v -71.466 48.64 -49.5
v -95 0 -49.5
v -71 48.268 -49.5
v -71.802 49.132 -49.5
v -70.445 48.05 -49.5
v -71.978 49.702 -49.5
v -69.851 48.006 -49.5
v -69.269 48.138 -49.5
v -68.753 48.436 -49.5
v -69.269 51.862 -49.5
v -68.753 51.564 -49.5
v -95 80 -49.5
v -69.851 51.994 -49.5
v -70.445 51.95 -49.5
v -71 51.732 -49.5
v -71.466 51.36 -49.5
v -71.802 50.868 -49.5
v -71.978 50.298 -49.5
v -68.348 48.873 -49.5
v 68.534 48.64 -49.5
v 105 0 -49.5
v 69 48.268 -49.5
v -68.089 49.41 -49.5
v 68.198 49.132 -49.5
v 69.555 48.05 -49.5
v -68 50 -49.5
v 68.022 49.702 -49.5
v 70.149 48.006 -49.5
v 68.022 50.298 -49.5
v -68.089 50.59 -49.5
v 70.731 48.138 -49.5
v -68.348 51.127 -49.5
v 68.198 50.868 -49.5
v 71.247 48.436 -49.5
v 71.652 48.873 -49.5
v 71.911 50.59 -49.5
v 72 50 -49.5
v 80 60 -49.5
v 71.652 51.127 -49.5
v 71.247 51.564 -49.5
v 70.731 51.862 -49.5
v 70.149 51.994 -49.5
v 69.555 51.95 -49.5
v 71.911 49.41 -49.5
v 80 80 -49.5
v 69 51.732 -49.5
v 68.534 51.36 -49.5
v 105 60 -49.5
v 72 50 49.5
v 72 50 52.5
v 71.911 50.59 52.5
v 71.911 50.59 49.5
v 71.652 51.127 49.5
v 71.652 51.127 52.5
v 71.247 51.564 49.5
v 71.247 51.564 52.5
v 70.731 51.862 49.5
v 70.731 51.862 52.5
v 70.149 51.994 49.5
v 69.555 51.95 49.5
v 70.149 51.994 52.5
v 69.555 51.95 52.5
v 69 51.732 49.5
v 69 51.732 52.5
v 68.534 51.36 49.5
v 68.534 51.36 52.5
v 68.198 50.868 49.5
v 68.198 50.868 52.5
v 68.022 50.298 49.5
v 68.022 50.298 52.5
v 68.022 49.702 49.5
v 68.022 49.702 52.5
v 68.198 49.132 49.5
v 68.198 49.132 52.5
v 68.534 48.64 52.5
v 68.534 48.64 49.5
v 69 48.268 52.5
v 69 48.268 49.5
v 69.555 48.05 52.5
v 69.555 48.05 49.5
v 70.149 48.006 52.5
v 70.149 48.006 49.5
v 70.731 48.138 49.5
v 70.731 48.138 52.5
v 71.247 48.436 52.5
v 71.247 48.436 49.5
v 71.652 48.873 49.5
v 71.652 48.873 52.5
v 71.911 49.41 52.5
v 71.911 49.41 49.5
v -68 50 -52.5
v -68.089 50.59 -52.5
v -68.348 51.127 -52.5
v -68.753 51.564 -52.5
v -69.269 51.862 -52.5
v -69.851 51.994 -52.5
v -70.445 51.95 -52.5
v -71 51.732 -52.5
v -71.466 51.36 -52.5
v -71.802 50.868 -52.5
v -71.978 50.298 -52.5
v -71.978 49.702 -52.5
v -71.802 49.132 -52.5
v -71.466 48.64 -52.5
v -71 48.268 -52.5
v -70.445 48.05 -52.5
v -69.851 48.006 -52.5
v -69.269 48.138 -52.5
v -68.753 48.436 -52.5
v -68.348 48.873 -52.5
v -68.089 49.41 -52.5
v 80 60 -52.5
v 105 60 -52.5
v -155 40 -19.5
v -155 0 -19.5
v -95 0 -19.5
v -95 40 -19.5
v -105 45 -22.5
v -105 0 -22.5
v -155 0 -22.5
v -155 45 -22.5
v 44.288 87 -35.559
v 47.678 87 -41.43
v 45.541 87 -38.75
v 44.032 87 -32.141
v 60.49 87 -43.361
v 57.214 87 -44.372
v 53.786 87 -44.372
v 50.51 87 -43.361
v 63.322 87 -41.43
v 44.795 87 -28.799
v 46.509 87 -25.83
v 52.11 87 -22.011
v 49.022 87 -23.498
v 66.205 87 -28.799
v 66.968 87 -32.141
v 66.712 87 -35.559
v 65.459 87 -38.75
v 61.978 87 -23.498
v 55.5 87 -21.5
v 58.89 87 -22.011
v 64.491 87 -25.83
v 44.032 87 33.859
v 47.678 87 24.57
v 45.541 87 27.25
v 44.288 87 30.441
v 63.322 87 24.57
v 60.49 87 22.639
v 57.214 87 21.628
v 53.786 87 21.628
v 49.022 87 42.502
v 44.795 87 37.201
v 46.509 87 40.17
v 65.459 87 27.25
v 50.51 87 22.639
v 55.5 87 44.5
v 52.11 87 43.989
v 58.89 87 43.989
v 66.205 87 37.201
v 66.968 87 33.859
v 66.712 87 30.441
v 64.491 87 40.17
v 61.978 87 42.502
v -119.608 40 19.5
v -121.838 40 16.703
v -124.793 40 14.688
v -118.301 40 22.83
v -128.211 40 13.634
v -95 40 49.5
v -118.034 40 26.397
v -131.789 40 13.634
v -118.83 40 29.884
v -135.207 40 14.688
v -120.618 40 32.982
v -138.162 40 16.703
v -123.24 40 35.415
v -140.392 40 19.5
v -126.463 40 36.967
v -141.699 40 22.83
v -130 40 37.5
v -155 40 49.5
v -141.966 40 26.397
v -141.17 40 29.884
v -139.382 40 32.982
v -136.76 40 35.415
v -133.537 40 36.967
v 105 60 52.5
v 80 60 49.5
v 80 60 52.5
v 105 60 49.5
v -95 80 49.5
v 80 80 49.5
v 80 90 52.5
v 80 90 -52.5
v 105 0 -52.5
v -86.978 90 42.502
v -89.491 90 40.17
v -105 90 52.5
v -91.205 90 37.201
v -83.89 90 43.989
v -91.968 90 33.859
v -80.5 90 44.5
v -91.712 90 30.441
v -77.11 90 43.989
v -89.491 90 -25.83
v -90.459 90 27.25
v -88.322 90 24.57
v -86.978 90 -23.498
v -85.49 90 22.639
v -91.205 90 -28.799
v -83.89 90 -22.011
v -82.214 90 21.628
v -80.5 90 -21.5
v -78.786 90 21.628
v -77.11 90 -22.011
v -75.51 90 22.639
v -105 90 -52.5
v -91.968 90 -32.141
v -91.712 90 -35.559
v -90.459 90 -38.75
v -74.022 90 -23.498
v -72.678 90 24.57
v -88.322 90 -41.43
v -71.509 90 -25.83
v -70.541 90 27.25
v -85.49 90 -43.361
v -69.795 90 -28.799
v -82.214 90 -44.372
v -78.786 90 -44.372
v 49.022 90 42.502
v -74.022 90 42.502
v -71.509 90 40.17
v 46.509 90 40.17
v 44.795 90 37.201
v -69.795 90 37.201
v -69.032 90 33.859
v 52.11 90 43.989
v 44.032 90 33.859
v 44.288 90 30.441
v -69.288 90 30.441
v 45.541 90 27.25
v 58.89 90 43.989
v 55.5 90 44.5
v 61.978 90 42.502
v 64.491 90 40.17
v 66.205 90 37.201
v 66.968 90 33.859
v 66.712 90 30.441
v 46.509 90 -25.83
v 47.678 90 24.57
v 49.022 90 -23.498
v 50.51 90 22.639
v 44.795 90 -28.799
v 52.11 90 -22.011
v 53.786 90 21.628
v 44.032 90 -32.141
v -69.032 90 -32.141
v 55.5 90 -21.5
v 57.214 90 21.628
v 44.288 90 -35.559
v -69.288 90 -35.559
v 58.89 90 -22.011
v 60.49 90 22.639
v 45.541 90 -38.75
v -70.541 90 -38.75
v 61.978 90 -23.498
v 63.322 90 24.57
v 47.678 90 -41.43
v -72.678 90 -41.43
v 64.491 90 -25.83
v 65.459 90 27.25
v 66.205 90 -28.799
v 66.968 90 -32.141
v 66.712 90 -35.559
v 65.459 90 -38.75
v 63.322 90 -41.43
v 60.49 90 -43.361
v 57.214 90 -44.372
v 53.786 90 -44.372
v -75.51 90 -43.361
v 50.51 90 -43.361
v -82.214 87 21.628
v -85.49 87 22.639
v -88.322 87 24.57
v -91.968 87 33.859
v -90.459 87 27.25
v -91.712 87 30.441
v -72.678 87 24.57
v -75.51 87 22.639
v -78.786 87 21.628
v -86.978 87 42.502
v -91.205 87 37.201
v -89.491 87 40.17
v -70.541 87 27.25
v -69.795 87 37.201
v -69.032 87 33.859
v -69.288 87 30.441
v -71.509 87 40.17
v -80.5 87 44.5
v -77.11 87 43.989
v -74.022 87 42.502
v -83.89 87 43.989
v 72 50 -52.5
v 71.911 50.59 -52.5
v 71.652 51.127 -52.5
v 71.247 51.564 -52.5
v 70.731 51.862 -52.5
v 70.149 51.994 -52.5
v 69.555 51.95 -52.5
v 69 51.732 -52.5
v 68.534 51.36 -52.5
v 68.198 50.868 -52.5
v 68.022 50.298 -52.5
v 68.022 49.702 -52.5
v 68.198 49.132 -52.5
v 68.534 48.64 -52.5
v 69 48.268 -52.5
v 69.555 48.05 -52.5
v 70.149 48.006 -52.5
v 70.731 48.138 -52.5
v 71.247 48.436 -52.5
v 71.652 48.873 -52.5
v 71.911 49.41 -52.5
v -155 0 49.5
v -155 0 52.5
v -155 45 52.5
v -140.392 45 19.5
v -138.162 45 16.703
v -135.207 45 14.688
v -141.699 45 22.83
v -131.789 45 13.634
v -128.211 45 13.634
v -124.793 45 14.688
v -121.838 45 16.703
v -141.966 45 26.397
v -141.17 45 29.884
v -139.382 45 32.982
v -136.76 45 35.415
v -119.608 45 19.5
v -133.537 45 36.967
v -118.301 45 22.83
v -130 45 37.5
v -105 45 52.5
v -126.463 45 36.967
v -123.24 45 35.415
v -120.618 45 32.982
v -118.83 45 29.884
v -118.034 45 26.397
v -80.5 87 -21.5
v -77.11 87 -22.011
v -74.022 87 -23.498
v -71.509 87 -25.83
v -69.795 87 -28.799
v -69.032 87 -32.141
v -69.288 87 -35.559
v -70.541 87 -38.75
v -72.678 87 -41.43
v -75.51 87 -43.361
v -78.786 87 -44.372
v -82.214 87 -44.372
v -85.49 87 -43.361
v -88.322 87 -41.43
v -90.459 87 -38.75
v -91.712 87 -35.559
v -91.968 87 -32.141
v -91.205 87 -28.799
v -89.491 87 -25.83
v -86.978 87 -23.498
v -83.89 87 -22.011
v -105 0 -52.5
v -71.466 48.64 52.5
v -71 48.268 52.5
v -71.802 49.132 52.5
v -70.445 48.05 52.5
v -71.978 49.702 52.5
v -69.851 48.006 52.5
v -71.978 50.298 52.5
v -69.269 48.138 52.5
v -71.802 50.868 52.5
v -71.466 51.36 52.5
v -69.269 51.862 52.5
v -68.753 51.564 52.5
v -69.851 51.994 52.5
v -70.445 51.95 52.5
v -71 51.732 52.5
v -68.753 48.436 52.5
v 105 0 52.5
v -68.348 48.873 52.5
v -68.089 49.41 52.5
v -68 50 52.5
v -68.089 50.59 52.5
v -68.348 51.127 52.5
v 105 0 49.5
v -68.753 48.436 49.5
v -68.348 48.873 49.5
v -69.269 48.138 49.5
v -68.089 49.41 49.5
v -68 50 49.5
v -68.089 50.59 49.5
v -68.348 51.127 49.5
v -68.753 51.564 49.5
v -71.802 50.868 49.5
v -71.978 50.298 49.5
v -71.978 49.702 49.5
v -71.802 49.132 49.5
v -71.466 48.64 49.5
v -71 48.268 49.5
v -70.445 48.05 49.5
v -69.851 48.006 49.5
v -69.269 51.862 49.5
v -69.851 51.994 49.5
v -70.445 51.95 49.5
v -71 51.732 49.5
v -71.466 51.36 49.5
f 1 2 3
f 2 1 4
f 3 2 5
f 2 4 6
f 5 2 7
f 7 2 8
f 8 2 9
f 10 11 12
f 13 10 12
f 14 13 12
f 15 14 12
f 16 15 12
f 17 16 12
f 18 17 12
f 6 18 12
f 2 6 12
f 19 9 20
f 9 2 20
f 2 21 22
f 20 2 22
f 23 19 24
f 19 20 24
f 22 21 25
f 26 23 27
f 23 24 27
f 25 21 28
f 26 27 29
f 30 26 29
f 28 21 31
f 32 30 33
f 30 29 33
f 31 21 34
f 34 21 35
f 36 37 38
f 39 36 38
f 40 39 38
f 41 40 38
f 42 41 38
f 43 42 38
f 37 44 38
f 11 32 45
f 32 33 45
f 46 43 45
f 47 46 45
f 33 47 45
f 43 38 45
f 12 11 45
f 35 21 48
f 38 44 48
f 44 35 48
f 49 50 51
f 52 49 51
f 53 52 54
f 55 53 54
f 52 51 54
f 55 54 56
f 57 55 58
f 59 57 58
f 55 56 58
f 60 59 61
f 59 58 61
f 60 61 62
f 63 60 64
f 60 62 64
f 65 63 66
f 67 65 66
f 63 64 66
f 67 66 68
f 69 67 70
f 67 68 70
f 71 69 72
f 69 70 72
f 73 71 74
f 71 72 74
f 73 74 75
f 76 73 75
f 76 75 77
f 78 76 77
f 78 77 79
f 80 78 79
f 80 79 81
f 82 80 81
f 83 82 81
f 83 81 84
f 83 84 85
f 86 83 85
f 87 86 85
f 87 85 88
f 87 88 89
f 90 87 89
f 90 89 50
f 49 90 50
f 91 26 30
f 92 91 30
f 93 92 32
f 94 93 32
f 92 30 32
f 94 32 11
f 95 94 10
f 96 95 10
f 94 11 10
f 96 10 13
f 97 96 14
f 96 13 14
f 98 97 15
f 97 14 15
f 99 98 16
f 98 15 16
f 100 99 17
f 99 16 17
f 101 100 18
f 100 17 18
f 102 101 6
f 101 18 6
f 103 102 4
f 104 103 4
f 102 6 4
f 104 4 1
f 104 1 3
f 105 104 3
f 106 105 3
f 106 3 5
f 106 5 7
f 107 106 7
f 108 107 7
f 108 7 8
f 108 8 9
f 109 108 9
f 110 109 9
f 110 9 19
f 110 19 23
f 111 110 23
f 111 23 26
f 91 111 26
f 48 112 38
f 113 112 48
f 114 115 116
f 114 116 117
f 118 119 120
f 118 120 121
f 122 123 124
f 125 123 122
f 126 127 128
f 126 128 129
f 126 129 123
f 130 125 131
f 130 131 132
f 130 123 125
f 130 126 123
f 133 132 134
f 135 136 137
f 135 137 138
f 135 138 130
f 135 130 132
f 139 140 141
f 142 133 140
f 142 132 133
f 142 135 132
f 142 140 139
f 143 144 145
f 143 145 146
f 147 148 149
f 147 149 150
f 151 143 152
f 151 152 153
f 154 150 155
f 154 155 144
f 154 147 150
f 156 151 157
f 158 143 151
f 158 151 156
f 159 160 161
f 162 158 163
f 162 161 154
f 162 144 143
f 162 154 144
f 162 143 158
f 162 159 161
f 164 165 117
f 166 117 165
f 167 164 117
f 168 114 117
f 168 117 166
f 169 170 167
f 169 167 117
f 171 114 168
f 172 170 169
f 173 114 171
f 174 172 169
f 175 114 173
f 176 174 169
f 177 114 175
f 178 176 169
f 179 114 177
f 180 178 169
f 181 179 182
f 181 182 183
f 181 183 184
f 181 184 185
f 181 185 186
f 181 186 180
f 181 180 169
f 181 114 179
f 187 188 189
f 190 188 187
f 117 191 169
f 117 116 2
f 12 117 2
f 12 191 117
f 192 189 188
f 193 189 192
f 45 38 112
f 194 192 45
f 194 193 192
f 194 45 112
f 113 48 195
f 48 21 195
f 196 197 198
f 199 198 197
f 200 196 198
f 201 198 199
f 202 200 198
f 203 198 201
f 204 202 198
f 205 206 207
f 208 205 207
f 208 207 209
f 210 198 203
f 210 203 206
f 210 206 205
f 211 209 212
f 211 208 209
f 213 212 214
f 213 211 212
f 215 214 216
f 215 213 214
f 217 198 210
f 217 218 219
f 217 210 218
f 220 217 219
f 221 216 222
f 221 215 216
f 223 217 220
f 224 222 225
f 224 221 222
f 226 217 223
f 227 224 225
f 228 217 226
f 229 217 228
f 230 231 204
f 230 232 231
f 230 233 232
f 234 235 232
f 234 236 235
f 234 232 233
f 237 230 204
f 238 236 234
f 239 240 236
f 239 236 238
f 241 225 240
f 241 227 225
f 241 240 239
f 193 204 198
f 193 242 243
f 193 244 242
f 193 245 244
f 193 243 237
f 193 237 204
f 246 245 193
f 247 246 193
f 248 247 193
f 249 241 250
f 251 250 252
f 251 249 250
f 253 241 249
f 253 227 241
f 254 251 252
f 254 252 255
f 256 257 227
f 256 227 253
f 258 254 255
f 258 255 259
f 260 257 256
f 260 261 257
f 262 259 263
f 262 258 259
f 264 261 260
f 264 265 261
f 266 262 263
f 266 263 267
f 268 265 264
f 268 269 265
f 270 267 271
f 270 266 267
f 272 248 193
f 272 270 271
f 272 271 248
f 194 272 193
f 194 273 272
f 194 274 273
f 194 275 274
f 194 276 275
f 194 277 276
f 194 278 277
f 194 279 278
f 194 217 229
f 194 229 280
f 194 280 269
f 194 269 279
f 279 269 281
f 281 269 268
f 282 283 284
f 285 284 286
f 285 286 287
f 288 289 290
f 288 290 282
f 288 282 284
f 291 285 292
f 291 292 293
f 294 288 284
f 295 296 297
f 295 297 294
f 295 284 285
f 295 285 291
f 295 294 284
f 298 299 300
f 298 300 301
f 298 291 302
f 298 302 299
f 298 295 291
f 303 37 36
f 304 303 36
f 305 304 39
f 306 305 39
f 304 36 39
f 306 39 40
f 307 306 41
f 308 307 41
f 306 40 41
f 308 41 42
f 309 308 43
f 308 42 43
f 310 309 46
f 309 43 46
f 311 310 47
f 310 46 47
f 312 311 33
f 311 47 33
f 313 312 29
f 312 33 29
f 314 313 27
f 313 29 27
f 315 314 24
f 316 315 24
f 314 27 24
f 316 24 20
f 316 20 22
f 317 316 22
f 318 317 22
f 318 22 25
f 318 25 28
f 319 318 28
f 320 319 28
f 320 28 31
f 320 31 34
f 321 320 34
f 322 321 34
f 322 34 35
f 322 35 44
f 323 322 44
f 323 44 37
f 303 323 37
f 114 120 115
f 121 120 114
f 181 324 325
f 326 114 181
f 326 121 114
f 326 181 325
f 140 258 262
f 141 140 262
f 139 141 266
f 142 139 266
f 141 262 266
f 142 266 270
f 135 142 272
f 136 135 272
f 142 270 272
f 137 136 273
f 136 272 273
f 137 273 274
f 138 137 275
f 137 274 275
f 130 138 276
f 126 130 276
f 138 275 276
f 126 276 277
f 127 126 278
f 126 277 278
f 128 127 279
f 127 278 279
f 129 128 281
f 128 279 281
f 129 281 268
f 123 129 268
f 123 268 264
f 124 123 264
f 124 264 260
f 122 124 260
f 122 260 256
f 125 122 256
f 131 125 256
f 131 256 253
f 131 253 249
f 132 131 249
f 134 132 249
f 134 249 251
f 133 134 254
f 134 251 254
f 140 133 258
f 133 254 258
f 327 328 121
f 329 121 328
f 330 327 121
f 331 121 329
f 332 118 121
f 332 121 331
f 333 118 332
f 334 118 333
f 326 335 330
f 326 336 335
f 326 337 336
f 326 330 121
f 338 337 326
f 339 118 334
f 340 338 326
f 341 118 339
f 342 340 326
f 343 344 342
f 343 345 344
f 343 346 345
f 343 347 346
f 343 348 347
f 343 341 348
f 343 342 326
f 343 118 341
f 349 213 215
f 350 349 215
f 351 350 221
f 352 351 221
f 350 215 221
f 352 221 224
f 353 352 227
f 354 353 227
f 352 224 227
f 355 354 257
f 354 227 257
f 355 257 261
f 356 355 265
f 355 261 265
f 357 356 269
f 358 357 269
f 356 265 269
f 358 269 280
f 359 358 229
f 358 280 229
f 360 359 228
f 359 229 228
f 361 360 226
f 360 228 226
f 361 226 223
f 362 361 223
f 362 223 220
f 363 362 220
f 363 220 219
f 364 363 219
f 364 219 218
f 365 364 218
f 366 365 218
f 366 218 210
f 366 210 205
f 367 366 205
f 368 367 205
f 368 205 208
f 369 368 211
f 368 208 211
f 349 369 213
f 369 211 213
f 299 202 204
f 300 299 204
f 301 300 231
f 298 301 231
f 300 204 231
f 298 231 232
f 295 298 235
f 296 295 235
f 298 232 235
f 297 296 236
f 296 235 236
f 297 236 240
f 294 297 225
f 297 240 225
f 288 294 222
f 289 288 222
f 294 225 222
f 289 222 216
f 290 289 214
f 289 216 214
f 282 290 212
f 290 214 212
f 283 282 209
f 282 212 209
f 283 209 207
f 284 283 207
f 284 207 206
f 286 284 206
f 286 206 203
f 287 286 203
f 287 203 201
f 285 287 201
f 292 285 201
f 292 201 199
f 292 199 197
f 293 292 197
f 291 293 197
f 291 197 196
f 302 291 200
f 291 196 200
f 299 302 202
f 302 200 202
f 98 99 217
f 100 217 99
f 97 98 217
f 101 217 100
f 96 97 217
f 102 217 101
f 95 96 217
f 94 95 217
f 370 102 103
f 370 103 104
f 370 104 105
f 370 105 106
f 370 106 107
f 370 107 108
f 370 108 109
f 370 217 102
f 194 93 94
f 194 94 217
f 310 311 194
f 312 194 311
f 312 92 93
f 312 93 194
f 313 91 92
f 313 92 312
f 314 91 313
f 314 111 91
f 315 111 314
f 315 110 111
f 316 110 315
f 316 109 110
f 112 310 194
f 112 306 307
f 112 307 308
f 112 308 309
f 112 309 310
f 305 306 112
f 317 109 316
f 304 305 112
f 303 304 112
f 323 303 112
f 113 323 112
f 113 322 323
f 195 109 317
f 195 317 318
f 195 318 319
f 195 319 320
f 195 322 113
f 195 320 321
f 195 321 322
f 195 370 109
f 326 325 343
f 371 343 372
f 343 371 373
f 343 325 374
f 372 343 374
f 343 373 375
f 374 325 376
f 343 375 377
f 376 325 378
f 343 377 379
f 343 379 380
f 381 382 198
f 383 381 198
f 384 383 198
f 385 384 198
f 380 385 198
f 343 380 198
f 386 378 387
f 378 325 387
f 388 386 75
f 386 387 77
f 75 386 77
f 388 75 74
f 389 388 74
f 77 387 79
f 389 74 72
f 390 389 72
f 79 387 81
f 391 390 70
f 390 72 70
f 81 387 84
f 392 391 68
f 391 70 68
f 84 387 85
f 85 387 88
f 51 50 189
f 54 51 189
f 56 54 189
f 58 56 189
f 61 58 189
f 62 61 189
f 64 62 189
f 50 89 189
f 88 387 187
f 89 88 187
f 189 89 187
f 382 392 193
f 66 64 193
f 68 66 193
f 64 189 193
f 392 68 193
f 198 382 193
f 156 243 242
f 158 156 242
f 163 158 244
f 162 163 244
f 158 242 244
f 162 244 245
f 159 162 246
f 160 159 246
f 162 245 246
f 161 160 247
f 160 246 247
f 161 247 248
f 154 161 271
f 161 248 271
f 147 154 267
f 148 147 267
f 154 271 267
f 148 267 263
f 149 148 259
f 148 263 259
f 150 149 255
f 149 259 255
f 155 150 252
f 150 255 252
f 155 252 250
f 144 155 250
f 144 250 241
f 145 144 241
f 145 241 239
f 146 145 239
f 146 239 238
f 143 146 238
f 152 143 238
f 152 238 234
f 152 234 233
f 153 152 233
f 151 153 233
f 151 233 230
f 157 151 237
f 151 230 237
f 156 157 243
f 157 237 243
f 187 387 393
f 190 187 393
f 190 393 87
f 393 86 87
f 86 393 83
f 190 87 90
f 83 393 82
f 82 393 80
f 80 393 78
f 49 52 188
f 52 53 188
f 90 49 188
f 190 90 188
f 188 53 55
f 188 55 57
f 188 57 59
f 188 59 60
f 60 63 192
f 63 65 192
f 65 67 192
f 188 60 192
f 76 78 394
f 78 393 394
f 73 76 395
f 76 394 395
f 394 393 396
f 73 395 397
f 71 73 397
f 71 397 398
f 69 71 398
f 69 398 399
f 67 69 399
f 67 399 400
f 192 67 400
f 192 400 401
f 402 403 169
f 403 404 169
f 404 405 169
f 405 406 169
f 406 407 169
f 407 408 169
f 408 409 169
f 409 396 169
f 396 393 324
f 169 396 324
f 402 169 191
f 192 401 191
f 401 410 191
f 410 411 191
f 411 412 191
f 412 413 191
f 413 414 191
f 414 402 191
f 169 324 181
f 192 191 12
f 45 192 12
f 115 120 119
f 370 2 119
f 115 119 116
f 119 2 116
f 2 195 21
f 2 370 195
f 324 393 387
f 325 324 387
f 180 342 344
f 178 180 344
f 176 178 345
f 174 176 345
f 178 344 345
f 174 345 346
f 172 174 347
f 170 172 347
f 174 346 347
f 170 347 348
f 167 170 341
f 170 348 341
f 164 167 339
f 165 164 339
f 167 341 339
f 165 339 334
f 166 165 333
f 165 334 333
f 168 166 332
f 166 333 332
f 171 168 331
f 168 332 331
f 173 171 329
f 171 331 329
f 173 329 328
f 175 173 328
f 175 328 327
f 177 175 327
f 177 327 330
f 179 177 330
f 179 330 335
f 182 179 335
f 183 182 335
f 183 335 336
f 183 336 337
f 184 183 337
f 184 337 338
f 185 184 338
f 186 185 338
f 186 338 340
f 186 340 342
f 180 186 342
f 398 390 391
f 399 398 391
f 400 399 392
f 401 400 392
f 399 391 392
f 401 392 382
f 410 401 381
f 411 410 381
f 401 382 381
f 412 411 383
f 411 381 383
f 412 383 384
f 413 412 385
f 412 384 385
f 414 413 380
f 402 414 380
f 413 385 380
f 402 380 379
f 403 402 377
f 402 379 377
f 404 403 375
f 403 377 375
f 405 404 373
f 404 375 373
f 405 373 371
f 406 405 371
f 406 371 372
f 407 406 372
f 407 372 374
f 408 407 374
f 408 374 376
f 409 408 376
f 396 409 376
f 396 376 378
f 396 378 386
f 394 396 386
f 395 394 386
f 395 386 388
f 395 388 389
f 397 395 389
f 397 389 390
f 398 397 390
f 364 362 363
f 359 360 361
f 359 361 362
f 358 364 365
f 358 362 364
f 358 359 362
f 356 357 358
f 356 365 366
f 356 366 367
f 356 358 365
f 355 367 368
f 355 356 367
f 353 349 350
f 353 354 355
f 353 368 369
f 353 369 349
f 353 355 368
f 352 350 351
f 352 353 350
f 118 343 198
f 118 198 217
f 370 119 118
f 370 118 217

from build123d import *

# Parameters (mm, degrees)
SKETCH_2_W          = 210
SKETCH_2_H          = 105
EXTRUDE_1_DEPTH     = 90
SKETCH_5_W          = 99
SKETCH_5_H          = 80
CUT_EXTRUDE_2_DEPTH = 200
SKETCH_6_W          = 75
SKETCH_6_H          = 45
EXTRUDE_2_DEPTH     = 50
SKETCH_7_W          = 69
SKETCH_7_H          = 40
CUT_EXTRUDE_3_DEPTH = 281.100428418
SKETCH_8_R          = 12
CUT_EXTRUDE_4_DEPTH = 170.724040725
SKETCH_9_R          = 2
CUT_EXTRUDE_5_DEPTH = 208.725780778
SKETCH_11_W         = 25
SKETCH_11_H         = 105
CUT_EXTRUDE_6_DEPTH = 30
SKETCH_4_R          = 11.5
CUT_EXTRUDE_8_DEPTH = 3


with BuildPart() as part:
    # 草图2 → 凸台-拉伸1 (new body)
    with BuildSketch(Plane(origin=(0, 0, 0), x_dir=(1, 0, 0), z_dir=(0, 1, 0))):
        Rectangle(SKETCH_2_W, SKETCH_2_H)
    extrude(amount=EXTRUDE_1_DEPTH)

    # 草图5 → 切除-拉伸2 (cut)
    with BuildSketch(Plane(origin=(105, 0, 0), x_dir=(0, 0, -1), z_dir=(1, 0, 0))):
        with Locations((0, 40)):
            Rectangle(SKETCH_5_W, SKETCH_5_H)
    extrude(amount=-CUT_EXTRUDE_2_DEPTH, mode=Mode.SUBTRACT)

    # 草图6 → 凸台-拉伸2 (add)
    with BuildSketch(Plane.ZY.offset(105)):
        with Locations((15, 22.5)):
            Rectangle(SKETCH_6_W, SKETCH_6_H)
    extrude(amount=EXTRUDE_2_DEPTH)

    # 草图7 → 切除-拉伸3 (cut, through all)
    with BuildSketch(Plane.ZY.offset(155)):
        with Locations((15, 20)):
            Rectangle(SKETCH_7_W, SKETCH_7_H)
    extrude(amount=-CUT_EXTRUDE_3_DEPTH, mode=Mode.SUBTRACT)

    # 草图8 → 切除-拉伸4 (cut, through all)
    with BuildSketch(Plane(origin=(0, 45, 0), x_dir=(1, 0, 0), z_dir=(0, 1, 0))):
        with Locations(Location((-130, -25.5, 0), (0, 0, 270))):
            Circle(SKETCH_8_R)
    extrude(amount=-CUT_EXTRUDE_4_DEPTH, mode=Mode.SUBTRACT)

    # 草图9 → 切除-拉伸5 (cut, through all)
    with BuildSketch(Plane.XY.offset(52.5)):
        with Locations((-70, 50)):
            Circle(SKETCH_9_R)
        with Locations((70, 50)):
            Circle(SKETCH_9_R)
    extrude(amount=-CUT_EXTRUDE_5_DEPTH, mode=Mode.SUBTRACT)

    # 草图11 → 切除-拉伸6 (cut)
    with BuildSketch(Plane(origin=(0, 90, 0), x_dir=(1, 0, 0), z_dir=(0, 1, 0))):
        with Locations((92.5, 0)):
            Rectangle(SKETCH_11_W, SKETCH_11_H)
    extrude(amount=-CUT_EXTRUDE_6_DEPTH, mode=Mode.SUBTRACT)

    # 草图4 → 切除-拉伸8 (cut)
    with BuildSketch(Plane(origin=(0, 90, 0), x_dir=(1, 0, 0), z_dir=(0, 1, 0))):
        with Locations(Location((-80.5, 33, 0), (0, 0, 270))):
            Circle(SKETCH_4_R)
        with Locations(Location((55.5, 33, 0), (0, 0, 270))):
            Circle(SKETCH_4_R)
        with Locations(Location((-80.5, -33, 0), (0, 0, 270))):
            Circle(SKETCH_4_R)
        with Locations(Location((55.5, -33, 0), (0, 0, 270))):
            Circle(SKETCH_4_R)
    extrude(amount=-CUT_EXTRUDE_8_DEPTH, mode=Mode.SUBTRACT)


solid = part.part
